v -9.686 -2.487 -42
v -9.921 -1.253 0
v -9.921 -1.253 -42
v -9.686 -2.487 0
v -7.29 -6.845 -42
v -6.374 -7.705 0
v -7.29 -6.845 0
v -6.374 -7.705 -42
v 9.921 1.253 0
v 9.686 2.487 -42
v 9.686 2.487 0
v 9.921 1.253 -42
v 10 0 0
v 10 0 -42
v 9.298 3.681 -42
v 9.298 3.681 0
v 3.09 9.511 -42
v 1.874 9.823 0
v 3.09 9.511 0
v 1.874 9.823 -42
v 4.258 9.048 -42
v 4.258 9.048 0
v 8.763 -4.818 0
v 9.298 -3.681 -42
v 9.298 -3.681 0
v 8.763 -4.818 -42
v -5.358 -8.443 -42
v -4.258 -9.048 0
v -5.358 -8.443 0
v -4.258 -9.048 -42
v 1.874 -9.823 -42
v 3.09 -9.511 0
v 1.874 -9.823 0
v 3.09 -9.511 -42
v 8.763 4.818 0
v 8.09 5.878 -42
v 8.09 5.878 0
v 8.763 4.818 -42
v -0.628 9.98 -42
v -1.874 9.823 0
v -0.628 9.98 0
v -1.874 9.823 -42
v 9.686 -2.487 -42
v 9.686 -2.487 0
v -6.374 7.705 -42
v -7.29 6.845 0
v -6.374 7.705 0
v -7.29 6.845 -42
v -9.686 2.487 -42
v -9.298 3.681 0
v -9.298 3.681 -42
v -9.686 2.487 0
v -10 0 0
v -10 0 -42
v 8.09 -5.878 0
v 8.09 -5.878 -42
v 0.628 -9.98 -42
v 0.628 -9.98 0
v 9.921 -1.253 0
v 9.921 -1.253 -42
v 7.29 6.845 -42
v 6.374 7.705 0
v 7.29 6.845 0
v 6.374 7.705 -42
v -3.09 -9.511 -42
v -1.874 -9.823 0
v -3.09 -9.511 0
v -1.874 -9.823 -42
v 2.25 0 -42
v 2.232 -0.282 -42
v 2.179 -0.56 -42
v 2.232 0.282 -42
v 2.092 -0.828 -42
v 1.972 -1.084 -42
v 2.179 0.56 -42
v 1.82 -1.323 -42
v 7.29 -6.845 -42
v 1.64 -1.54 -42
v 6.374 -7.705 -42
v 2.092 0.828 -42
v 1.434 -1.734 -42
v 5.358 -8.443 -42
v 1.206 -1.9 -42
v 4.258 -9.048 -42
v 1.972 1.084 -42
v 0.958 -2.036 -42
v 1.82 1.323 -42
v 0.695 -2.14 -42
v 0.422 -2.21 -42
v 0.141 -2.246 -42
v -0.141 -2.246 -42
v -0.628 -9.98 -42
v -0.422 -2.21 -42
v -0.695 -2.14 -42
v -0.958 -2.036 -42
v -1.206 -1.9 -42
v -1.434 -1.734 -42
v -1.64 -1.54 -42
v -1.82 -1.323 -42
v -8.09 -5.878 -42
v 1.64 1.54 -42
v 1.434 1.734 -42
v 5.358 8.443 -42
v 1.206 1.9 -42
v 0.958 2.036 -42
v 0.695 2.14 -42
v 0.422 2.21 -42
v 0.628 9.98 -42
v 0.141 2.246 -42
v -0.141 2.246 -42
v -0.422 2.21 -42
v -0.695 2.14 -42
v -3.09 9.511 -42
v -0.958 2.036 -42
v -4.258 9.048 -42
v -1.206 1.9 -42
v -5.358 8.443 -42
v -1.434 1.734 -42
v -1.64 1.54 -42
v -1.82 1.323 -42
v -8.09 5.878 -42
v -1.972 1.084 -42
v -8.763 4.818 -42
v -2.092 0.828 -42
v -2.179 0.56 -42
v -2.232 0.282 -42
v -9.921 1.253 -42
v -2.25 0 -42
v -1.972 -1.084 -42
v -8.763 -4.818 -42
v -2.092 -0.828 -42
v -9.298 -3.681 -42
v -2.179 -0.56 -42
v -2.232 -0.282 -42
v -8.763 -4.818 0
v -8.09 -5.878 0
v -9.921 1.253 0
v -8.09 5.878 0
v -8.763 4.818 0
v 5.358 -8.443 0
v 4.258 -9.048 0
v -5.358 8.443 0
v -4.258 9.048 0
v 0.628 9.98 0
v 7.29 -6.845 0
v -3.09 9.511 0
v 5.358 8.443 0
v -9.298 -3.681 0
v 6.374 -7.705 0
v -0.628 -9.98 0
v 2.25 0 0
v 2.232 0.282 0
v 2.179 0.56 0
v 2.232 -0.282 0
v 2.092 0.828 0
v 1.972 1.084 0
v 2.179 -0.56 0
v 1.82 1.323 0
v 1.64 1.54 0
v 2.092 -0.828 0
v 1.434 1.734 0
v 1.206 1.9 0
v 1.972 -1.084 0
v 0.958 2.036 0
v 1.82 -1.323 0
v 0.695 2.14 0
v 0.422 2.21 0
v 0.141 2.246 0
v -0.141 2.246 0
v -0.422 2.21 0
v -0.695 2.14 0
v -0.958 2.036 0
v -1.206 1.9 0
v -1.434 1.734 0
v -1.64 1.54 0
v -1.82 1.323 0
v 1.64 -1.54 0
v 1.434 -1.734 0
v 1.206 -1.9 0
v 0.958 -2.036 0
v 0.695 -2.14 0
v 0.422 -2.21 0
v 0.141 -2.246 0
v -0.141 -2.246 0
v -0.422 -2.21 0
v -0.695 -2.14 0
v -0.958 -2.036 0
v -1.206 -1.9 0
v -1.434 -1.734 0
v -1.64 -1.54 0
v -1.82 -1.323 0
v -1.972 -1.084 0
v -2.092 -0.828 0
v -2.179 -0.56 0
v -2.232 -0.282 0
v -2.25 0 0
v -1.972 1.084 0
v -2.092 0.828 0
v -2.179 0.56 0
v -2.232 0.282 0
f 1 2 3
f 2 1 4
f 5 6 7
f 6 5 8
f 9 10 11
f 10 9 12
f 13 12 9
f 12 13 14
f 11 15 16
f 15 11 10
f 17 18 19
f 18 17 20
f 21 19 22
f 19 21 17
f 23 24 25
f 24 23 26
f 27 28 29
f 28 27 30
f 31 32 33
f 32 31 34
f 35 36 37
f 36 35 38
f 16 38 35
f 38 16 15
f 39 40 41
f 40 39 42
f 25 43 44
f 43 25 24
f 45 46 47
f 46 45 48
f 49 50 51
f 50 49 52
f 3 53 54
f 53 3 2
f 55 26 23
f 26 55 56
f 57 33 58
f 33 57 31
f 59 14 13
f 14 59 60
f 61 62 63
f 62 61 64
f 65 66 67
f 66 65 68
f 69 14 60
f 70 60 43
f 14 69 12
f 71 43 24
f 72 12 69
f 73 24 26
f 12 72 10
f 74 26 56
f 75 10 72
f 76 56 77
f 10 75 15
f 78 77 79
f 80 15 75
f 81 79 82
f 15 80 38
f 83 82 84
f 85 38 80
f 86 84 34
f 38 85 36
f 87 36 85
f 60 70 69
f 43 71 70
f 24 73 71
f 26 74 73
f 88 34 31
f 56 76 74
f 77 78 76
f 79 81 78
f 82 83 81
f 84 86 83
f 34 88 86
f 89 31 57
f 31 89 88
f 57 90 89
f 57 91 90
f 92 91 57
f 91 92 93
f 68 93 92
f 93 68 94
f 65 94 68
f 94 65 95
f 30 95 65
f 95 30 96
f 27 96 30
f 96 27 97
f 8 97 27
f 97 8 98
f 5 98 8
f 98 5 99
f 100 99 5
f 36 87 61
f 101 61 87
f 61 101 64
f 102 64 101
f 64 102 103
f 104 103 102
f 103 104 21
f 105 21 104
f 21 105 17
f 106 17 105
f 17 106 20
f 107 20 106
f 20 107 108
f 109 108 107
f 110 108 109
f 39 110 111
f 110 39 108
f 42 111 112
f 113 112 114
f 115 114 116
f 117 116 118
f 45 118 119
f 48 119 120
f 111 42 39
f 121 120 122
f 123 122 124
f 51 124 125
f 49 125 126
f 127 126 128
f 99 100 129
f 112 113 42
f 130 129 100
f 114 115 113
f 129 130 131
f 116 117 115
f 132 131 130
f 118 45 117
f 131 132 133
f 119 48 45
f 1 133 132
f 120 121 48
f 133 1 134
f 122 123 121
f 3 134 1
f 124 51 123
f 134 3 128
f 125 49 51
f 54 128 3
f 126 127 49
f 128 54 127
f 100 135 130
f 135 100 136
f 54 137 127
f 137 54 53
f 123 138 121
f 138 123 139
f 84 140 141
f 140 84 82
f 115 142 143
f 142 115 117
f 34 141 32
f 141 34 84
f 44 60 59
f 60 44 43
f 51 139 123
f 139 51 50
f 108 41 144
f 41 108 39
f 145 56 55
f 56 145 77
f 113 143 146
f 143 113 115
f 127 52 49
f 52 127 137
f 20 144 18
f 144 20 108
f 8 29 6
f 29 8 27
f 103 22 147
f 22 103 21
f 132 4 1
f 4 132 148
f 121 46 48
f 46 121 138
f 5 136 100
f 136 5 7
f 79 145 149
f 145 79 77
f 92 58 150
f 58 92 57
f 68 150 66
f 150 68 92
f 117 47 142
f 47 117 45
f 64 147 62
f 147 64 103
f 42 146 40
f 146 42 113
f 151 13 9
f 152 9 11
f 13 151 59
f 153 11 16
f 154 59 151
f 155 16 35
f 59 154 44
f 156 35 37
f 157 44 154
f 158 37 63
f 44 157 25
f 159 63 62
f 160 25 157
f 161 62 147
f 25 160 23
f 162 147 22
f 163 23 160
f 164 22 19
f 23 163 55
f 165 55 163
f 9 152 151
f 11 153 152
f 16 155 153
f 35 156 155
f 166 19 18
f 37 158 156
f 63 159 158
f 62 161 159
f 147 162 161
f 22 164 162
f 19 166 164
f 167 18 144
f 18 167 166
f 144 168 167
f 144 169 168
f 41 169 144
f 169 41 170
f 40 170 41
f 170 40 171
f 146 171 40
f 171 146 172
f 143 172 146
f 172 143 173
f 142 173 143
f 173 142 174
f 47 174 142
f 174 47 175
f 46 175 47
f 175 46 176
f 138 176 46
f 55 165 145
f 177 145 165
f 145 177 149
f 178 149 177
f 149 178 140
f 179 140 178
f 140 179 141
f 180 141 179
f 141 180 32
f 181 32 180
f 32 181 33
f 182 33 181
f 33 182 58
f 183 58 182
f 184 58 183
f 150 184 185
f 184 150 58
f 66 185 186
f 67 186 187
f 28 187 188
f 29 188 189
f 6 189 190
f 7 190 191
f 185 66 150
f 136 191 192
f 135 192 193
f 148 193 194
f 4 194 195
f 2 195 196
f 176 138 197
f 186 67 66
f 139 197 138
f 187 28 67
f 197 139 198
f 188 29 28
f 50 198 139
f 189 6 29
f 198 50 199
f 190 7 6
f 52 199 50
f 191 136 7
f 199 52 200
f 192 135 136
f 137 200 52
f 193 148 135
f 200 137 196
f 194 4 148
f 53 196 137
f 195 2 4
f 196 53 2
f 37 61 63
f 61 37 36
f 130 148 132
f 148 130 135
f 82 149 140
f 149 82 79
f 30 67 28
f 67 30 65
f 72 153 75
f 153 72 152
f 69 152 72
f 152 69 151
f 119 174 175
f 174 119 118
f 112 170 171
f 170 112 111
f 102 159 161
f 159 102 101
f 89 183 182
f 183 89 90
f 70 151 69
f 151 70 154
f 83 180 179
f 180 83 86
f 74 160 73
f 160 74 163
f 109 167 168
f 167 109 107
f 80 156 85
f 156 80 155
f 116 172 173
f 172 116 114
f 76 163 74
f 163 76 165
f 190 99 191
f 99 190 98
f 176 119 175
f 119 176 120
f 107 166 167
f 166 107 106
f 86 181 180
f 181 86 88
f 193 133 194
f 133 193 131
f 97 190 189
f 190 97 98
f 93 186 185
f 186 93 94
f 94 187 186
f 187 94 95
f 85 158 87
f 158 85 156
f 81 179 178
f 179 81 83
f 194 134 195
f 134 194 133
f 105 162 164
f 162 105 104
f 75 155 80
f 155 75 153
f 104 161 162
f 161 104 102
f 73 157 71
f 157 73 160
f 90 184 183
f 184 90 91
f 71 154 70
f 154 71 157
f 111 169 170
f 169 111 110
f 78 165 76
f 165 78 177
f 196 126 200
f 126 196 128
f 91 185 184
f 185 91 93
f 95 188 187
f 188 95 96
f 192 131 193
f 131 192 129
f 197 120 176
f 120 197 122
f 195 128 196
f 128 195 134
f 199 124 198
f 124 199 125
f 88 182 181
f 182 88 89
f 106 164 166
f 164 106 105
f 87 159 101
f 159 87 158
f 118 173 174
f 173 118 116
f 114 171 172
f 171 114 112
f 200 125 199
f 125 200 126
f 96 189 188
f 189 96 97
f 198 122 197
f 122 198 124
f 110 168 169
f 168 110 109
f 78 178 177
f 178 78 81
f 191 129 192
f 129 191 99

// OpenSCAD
$fn = 50;


difference() {
	union() {
		translate(v = [0, 0, -42.0000000000]) {
			cylinder(h = 42, r = 10.0000000000);
		}
		cylinder(h = 0, r = 20.0000000000);
	}
	union() {
		#translate(v = [0, 0, -42]) {
			cylinder(h = 42, r = 2.2500000000);
		}
	}
}
